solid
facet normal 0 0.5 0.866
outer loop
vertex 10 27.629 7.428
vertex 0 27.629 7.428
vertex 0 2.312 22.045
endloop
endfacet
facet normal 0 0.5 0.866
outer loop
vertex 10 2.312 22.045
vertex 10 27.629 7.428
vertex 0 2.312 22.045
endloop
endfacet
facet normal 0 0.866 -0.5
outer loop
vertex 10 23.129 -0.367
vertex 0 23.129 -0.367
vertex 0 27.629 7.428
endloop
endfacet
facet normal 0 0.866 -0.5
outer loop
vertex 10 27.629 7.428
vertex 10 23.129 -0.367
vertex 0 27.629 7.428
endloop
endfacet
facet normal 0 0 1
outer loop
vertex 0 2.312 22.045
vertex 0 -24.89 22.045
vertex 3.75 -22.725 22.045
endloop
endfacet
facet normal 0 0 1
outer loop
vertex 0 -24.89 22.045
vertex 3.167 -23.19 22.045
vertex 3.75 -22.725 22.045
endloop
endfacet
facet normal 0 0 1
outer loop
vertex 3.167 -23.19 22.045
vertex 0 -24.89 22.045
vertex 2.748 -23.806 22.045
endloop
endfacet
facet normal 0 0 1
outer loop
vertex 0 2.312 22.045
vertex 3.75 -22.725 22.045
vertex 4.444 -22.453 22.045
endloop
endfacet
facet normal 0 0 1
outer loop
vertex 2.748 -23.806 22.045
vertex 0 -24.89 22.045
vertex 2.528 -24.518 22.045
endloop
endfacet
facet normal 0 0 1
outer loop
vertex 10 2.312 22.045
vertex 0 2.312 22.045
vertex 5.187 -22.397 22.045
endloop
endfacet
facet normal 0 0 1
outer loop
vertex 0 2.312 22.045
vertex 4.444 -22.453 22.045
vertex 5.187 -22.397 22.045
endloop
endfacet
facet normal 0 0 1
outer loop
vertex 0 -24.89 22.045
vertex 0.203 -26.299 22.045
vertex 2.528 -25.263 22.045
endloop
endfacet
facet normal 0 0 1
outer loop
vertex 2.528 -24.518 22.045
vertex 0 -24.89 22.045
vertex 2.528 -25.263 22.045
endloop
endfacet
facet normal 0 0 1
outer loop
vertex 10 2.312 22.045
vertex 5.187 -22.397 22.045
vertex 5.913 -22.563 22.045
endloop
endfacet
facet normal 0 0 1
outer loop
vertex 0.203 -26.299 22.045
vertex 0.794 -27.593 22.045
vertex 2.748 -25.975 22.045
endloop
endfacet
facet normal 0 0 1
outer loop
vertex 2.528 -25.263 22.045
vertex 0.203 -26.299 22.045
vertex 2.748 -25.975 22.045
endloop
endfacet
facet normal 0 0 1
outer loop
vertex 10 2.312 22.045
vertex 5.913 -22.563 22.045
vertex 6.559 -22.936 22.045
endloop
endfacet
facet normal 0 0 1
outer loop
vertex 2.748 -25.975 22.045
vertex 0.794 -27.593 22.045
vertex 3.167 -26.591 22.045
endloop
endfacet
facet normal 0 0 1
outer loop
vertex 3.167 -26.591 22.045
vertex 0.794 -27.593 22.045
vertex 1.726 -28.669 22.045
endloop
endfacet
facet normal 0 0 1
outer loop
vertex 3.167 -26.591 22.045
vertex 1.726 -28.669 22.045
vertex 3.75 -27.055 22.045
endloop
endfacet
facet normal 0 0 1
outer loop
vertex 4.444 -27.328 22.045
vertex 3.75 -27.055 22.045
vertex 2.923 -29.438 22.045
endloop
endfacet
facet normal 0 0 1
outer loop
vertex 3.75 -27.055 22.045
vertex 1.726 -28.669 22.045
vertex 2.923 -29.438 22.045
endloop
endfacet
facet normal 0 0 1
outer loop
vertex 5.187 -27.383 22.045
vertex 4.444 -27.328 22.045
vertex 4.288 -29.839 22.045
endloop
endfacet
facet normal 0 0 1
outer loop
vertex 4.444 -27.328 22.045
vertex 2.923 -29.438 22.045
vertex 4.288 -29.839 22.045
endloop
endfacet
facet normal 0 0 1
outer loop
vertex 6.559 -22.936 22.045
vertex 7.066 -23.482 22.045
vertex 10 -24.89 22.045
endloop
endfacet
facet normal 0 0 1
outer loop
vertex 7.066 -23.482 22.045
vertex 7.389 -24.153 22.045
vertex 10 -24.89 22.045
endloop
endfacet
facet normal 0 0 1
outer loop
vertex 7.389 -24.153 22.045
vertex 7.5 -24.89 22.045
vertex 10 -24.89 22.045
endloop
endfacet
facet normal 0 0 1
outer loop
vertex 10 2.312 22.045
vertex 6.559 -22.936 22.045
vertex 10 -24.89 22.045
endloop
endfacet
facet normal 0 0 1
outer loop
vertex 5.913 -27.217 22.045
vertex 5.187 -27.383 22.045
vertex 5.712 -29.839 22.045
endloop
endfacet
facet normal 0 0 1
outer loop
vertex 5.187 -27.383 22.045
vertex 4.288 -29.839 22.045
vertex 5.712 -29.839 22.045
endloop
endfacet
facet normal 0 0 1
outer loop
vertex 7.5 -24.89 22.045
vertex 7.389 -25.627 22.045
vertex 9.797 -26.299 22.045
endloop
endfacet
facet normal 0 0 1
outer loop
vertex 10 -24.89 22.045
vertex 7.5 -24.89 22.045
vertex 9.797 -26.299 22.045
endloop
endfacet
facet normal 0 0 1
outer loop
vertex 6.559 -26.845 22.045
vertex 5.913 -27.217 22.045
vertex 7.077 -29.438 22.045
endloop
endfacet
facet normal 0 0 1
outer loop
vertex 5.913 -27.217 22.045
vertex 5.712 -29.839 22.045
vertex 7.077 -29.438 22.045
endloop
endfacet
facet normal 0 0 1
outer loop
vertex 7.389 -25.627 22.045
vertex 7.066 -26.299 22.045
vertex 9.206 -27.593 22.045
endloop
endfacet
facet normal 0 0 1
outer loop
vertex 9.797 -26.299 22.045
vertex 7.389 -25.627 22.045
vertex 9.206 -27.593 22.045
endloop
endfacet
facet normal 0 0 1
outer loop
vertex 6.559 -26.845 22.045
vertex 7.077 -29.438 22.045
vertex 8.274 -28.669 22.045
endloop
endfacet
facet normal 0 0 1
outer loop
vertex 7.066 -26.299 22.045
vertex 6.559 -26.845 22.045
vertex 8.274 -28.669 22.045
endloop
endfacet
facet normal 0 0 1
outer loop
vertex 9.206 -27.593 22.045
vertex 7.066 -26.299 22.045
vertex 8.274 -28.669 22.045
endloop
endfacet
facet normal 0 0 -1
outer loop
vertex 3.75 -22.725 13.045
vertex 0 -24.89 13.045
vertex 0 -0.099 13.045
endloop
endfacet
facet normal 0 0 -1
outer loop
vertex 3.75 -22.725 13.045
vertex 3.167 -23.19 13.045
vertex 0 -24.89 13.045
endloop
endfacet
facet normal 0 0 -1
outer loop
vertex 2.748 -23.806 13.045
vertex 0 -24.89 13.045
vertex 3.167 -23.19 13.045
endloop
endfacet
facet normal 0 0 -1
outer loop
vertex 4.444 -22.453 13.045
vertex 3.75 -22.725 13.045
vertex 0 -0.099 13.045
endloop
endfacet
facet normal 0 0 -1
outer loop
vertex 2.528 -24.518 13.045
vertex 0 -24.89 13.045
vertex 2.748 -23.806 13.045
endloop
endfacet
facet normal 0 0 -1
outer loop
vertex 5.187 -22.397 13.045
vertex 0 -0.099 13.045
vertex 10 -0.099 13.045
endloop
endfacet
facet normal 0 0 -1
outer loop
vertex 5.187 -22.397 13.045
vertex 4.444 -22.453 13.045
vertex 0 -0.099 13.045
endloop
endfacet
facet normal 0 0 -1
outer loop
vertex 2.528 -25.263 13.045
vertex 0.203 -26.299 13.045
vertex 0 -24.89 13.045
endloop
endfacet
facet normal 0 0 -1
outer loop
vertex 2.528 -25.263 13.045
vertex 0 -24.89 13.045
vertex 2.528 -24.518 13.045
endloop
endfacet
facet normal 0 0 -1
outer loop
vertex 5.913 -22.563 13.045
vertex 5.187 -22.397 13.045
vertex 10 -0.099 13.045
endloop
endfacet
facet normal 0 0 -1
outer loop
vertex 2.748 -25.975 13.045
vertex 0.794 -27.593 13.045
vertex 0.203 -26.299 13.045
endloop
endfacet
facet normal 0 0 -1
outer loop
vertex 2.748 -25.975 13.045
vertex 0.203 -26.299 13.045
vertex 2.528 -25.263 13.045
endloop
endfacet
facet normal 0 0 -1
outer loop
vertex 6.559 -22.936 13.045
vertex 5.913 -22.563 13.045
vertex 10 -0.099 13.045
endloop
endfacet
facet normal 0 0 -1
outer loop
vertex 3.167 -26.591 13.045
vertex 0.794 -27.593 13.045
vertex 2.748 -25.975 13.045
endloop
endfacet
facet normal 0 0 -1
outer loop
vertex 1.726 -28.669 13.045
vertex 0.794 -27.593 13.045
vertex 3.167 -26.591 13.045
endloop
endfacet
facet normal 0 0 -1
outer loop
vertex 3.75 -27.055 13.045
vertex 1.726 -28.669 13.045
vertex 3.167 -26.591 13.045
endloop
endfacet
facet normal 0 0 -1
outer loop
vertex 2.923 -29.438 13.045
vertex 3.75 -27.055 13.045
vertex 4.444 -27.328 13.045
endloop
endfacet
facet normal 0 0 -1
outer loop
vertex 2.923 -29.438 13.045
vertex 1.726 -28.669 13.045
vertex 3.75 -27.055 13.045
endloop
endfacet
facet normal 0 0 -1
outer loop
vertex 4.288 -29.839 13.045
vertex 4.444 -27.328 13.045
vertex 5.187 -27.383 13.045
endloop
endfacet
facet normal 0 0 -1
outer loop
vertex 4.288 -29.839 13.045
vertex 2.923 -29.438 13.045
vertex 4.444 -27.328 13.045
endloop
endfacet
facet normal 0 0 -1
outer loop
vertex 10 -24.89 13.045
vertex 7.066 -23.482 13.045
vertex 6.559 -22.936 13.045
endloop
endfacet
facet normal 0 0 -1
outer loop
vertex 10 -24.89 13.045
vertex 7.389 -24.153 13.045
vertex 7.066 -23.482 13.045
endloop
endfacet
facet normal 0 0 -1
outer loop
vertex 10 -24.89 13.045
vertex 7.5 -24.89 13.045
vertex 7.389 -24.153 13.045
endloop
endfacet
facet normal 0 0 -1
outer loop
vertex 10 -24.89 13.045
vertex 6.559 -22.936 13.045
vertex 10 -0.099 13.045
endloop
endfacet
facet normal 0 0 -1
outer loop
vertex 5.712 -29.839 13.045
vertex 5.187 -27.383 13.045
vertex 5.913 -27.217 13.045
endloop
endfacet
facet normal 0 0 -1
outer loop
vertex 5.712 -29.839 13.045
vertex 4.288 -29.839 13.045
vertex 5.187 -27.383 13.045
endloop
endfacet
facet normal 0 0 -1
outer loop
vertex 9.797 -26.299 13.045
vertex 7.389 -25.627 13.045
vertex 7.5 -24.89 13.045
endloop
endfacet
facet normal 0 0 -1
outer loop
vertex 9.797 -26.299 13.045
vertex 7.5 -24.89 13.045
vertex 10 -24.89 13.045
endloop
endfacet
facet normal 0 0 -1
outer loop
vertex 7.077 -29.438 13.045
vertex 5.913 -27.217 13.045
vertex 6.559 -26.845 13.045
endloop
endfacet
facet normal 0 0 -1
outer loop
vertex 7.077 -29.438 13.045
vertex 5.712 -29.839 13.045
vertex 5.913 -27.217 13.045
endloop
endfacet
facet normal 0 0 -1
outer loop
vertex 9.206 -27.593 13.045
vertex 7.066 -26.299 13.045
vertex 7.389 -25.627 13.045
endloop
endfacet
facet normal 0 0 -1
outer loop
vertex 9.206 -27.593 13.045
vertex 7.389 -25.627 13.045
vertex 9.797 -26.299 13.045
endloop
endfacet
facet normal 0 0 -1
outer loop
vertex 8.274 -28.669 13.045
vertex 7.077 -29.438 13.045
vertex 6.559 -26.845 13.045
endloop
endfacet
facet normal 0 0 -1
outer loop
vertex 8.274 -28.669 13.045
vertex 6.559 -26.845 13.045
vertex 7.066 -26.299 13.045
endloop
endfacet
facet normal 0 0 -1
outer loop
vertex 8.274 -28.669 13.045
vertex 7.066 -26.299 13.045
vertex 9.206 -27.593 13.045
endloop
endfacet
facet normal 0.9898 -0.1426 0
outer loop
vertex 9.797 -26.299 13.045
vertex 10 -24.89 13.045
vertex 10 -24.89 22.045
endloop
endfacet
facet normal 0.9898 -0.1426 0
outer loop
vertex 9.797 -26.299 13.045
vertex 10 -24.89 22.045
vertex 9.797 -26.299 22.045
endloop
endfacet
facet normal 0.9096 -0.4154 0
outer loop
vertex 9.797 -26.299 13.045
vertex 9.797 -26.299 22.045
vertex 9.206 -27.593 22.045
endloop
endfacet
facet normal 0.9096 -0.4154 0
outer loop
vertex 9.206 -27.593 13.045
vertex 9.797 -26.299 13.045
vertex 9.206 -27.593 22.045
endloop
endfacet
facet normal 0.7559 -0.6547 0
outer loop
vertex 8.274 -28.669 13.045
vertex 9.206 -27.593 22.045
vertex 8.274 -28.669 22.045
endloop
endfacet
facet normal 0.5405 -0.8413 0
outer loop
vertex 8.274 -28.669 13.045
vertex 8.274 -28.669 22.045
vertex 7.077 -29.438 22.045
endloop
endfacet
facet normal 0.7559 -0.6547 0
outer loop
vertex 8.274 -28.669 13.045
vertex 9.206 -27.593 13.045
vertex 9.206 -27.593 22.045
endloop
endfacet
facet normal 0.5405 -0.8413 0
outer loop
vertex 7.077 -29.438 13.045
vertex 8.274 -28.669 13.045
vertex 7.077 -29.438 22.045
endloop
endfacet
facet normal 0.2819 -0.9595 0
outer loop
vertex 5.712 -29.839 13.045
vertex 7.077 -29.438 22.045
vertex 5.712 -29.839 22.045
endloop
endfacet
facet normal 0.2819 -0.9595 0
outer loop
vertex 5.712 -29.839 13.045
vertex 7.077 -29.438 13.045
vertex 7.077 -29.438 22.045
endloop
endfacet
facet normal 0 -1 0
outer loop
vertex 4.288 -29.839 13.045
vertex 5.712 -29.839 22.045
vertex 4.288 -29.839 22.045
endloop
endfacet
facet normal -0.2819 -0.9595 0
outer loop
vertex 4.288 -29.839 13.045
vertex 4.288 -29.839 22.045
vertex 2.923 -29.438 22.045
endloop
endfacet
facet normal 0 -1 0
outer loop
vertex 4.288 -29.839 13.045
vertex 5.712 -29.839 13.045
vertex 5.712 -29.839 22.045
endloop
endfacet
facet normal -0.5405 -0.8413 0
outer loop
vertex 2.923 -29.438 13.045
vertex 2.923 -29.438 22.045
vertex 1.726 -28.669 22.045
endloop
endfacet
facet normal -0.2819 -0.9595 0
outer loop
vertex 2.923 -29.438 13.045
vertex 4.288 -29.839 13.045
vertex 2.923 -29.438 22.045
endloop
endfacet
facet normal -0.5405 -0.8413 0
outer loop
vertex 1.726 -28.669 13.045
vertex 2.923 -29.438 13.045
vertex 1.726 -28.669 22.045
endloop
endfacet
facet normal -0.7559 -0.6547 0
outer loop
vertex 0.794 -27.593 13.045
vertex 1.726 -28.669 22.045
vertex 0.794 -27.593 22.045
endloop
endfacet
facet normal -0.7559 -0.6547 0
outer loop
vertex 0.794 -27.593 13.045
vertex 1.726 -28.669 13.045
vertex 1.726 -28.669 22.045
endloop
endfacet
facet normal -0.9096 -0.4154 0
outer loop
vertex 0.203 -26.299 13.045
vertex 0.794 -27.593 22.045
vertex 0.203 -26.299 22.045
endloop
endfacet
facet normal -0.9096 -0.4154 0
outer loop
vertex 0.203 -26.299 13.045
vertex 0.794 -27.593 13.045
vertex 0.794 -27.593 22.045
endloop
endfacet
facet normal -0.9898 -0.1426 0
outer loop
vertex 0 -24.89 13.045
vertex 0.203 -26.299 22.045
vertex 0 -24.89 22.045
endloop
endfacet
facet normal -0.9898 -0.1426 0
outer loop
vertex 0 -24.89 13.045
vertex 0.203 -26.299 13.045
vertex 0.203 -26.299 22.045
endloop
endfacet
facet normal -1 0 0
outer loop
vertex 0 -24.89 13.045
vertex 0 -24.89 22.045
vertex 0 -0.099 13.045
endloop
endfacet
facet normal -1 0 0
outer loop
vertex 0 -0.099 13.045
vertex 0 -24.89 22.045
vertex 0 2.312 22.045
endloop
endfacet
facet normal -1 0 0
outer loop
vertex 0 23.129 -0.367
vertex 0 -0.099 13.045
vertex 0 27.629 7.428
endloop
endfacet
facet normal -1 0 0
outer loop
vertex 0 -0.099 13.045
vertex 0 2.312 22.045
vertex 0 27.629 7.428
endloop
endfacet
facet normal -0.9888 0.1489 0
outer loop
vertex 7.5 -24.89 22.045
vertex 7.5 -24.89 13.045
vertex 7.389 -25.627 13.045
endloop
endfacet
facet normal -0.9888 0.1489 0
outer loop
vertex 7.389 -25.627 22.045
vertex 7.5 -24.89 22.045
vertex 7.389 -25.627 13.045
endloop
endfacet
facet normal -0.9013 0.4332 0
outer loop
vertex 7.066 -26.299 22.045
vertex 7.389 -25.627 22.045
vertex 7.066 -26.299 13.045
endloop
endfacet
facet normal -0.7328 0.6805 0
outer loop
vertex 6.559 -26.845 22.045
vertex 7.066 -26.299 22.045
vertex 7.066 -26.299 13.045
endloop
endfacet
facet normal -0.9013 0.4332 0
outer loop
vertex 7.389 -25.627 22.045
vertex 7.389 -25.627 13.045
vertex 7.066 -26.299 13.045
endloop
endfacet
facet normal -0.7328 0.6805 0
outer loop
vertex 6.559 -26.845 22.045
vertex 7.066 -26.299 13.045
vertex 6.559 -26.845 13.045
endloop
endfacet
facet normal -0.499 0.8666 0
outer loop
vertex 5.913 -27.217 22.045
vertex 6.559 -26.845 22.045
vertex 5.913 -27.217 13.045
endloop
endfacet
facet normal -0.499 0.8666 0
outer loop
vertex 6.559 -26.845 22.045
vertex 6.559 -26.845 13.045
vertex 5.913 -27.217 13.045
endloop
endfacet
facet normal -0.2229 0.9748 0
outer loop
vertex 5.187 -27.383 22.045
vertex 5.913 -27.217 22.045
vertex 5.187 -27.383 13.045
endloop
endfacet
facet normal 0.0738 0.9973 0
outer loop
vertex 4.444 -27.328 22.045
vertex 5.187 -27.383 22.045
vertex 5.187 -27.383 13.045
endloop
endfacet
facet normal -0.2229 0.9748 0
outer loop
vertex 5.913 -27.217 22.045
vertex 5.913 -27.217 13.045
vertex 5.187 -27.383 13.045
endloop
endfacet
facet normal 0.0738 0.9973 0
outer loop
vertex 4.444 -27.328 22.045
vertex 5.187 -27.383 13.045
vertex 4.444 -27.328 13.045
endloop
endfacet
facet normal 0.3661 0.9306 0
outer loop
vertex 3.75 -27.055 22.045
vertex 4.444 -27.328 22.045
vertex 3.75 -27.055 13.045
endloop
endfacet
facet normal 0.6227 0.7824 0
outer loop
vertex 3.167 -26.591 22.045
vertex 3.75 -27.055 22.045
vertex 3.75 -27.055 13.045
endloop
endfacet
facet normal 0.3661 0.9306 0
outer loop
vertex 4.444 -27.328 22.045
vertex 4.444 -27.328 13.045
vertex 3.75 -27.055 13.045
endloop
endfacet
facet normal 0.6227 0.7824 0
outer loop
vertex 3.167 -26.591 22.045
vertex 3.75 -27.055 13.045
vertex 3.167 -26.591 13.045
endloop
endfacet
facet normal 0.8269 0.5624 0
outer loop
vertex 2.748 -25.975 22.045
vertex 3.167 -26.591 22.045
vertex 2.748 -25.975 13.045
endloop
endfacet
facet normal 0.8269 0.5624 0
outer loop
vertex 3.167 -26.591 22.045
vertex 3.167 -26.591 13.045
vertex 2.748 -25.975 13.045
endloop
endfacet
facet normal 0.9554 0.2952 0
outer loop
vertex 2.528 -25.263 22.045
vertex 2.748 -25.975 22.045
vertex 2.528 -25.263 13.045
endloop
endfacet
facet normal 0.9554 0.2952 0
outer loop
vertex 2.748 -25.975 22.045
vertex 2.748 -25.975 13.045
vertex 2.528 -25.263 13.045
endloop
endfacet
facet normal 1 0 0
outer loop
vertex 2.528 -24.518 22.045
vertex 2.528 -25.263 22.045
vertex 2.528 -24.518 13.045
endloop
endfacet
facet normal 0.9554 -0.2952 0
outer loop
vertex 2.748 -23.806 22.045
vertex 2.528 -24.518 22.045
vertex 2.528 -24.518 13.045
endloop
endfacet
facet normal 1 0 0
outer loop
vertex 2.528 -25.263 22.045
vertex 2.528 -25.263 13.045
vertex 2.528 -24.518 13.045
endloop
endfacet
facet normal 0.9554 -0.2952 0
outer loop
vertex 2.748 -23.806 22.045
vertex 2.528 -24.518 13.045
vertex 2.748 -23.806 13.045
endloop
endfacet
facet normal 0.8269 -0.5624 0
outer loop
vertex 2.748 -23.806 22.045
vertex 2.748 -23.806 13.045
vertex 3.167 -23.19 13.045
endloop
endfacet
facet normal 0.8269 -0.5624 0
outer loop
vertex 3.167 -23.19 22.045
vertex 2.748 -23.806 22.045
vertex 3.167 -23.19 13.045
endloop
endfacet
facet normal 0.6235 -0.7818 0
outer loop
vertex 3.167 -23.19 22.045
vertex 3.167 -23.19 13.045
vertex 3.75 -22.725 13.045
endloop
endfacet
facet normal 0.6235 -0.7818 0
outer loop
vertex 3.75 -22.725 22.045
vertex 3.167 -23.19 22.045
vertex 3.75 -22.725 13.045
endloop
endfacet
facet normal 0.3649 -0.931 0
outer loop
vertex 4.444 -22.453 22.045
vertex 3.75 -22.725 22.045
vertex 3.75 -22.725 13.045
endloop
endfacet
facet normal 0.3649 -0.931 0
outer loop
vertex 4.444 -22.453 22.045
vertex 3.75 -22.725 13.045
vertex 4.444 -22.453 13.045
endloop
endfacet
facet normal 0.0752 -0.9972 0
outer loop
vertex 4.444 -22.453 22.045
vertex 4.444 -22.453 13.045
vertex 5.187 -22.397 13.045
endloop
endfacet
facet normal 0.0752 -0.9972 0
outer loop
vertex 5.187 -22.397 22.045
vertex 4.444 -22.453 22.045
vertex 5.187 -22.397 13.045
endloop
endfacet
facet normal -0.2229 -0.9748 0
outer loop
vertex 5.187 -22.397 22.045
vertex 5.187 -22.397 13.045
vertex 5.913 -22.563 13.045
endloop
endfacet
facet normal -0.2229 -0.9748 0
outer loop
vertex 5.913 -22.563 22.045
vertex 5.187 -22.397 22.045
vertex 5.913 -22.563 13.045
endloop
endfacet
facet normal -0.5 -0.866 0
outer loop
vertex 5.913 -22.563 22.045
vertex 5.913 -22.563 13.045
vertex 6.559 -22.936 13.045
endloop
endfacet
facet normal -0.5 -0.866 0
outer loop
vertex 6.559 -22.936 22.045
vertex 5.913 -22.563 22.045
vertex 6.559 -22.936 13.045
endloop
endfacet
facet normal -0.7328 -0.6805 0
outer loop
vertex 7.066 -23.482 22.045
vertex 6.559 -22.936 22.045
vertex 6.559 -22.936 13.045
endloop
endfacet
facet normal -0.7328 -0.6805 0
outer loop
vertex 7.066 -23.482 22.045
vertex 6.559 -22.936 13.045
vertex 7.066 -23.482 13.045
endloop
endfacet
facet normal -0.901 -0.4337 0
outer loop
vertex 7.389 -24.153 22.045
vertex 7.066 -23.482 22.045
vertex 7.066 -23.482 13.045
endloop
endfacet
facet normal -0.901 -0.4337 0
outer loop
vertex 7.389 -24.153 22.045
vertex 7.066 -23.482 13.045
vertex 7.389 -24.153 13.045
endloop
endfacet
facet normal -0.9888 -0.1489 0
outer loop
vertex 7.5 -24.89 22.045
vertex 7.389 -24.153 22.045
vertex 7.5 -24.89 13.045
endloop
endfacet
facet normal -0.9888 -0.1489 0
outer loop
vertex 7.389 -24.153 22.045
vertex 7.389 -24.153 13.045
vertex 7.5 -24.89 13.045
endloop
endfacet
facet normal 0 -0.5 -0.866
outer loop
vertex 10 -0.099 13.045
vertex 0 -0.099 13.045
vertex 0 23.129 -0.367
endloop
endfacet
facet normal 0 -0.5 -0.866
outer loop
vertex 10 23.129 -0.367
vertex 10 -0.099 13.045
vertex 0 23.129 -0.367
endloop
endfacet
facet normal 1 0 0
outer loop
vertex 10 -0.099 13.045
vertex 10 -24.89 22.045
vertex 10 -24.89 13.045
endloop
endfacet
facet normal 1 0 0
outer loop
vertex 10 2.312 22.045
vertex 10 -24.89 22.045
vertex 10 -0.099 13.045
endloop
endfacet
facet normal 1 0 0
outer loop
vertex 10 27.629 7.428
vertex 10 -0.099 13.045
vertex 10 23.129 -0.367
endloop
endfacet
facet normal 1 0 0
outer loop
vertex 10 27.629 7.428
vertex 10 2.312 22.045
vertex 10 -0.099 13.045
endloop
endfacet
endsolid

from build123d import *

# Parameters (mm, degrees)
F1_DEPTH = 10
F3_DEPTH = 9
F4_R     = 2.5
F5_DEPTH = 9


with BuildPart() as f1:
    # F0 (on Right) → F1 (new body)
    with BuildSketch(Plane.YZ):
        Polygon((2.31229, 22.044512), (-24.890254, 22.044512), (-24.890254, 13.044512), (-0.099253, 13.044512), (23.129309, -0.366504), (27.629309, 7.427725), align=None)
    extrude(amount=F1_DEPTH)

    # F2 (on face) → F3 (join)
    with BuildSketch(Plane(origin=(0, 0, 13.044512), x_dir=(1, 0, 0), z_dir=(0, 0, -1))):
        with BuildLine():
            Line((0, 24.890254), (10, 24.890254))
            ThreePointArc((10, 24.890254), (5, 29.890254), (0, 24.890254))
        make_face()
    extrude(amount=-F3_DEPTH)

    # F4 (on face) → F5 (cut)
    with BuildSketch(Plane(origin=(0, 0, 13.044512), x_dir=(1, 0, 0), z_dir=(0, 0, -1))):
        with Locations((5, 24.890254)):
            Circle(F4_R)
    extrude(amount=-F5_DEPTH, mode=Mode.SUBTRACT)


solid = f1.part
